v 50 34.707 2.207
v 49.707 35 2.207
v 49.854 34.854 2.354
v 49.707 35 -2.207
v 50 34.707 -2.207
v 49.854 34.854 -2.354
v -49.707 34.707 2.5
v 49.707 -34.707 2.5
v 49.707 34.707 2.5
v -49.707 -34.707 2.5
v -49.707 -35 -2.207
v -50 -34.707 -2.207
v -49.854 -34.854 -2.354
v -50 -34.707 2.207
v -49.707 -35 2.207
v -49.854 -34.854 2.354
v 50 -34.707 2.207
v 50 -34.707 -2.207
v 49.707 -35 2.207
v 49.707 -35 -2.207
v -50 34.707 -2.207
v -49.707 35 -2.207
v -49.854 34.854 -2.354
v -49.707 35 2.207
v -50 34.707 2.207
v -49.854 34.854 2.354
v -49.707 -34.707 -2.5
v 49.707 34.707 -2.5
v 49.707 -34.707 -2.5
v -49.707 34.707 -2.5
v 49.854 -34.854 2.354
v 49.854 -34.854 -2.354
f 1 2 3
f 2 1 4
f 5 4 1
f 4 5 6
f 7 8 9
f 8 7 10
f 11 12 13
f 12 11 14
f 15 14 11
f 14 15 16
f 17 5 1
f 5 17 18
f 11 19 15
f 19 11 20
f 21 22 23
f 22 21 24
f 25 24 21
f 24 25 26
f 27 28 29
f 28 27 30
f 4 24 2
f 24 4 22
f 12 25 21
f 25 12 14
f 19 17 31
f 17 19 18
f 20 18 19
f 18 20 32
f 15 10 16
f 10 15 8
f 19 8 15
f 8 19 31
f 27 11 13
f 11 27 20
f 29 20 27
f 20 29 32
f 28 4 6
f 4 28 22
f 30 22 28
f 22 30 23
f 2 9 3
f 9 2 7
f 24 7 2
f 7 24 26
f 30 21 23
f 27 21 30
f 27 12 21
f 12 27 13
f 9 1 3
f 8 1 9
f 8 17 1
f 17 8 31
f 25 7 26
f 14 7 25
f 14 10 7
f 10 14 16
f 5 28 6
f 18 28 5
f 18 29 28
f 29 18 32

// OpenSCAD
/*[Part]*/
part_to_print = "tile base"; // [tile base, tile, puzzle base, puzzle piece]
tile_or_puzzle_piece_number = 1; // [1,2,3,4,5,6,7,8,9,10,11,12,13,14,15,16,17,18,19,20]
//does not apply to base-specific measurements
scale_all_parts = 100; // [50:500]

/*[Base Options]*/
base_width = 100; // [20:300]
base_height = 70; // [20:300]
base_thickness = 5; // [3:10]

/*[Tile Base Options]*/
num_columns = 3; // [1:5]
num_rows = 2; // [1:5]
rail_width = 2; // [0:20]
include_target_graphics = "yes"; // [yes,no]
include_tile_slots = "yes"; // [yes,no]
include_earth_and_sky_lines = "no"; // [yes,no]

/*[Puzzle Base Options]*/
base_shape = "rectangular"; // [rectangular, circular]
include_puzzle_piece_slots = "no"; // [yes,no]

/*[Tile-Piece Options]*/
tile_thickness = 3; // [3:9]
slot_gap = 1; // [0:0.1:3]
graphic_height = 2; // [1:5]

/*[--Tile-Piece 1 Info]*/
tile_piece_svg_1 = "";
move_1_vertically = 0; // [-200:200]
move_piece_1_horizontally = 0; // [-200:200]
piece_1_scaling = 100; // [50:200]
piece_1_height = 20; // [5:300]
piece_1_width = 20; // [5:300]
embed_RFID_tag_1 = "no"; // [yes,no]

/*[--Tile-Piece 2 Info]*/
tile_piece_svg_2 = "";
move_2_vertically = 0; // [-200:200]
move_piece_2_horizontally = 0; // [-200:200]
piece_2_scaling = 100; // [50:200]
piece_2_height = 20; // [5:300]
piece_2_width = 20; // [5:300]
embed_RFID_tag_2 = "no"; // [yes,no]

/*[--Tile-Piece 3 Info]*/
tile_piece_svg_3 = "";
move_3_vertically = 0; // [-200:200]
move_piece_3_horizontally = 0; // [-200:200]
piece_3_scaling = 100; // [50:200]
piece_3_height = 20; // [5:300]
piece_3_width = 20; // [5:300]
embed_RFID_tag_3 = "no"; // [yes,no]

/*[--Tile-Piece 4 Info]*/
tile_piece_svg_4 = "";
move_4_vertically = 0; // [-200:200]
move_piece_4_horizontally = 0; // [-200:200]
piece_4_scaling = 100; // [50:200]
piece_4_height = 20; // [5:300]
piece_4_width = 20; // [5:300]
embed_RFID_tag_4 = "no"; // [yes,no]

/*[--Tile-Piece 5 Info]*/
tile_piece_svg_5 = "";
move_5_vertically = 0; // [-200:200]
move_piece_5_horizontally = 0; // [-200:200]
piece_5_scaling = 100; // [50:200]
piece_5_height = 20; // [5:300]
piece_5_width = 20; // [5:300]
embed_RFID_tag_5 = "no"; // [yes,no]

/*[--Tile-Piece 6 Info]*/
tile_piece_svg_6 = "";
move_6_vertically = 0; // [-200:200]
move_piece_6_horizontally = 0; // [-200:200]
piece_6_scaling = 100; // [50:200]
piece_6_height = 20; // [5:300]
piece_6_width = 20; // [5:300]
embed_RFID_tag_6 = "no"; // [yes,no]

/*[--Tile-Piece 7 Info]*/
tile_piece_svg_7 = "";
move_7_vertically = 0; // [-200:200]
move_piece_7_horizontally = 0; // [-200:200]
piece_7_scaling = 100; // [50:200]
piece_7_height = 20; // [10:300]
piece_7_width = 20; // [10:300]
embed_RFID_tag_7 = "no"; // [yes,no]

/*[--Tile-Piece 8 Info]*/
tile_piece_svg_8 = "";
move_8_vertically = 0; // [-200:200]
move_piece_8_horizontally = 0; // [-200:200]
piece_8_scaling = 100; // [50:200]
piece_8_height = 20; // [10:300]
piece_8_width = 20; // [10:300]
embed_RFID_tag_8 = "no"; // [yes,no]

/*[--Tile-Piece 9 Info]*/
tile_piece_svg_9 = "";
move_9_vertically = 0; // [-200:200]
move_piece_9_horizontally = 0; // [-200:200]
piece_9_scaling = 100; // [50:200]
piece_9_height = 20; // [10:300]
piece_9_width = 20; // [10:300]
embed_RFID_tag_9 = "no"; // [yes,no]

/*[--Tile-Piece 10 Info]*/
tile_piece_svg_10 = "";
move_10_vertically = 0; // [-200:200]
move_piece_10_horizontally = 0; // [-200:200]
piece_10_scaling = 100; // [50:200]
piece_10_height = 20; // [10:300]
piece_10_width = 20; // [10:300]
embed_RFID_tag_10 = "no"; // [yes,no]

/*[--Tile-Piece 11 Info]*/
tile_piece_svg_11 = "";
move_11_vertically = 0; // [-200:200]
move_piece_11_horizontally = 0; // [-200:200]
piece_11_scaling = 100; // [50:200]
piece_11_height = 20; // [10:300]
piece_11_width = 20; // [10:300]
embed_RFID_tag_11 = "no"; // [yes,no]

/*[--Tile-Piece 12 Info]*/
tile_piece_svg_12 = "";
move_12_vertically = 0; // [-200:200]
move_piece_12_horizontally = 0; // [-200:200]
piece_12_scaling = 100; // [50:200]
piece_12_height = 20; // [10:300]
piece_12_width = 20; // [10:300]
embed_RFID_tag_12 = "no"; // [yes,no]

/*[--Tile-Piece 13 Info]*/
tile_piece_svg_13 = "";
move_13_vertically = 0; // [-200:200]
move_piece_13_horizontally = 0; // [-200:200]
piece_13_scaling = 100; // [50:200]
piece_13_height = 20; // [10:300]
piece_13_width = 20; // [10:300]
embed_RFID_tag_13 = "no"; // [yes,no]

/*[--Tile-Piece 14 Info]*/
tile_piece_svg_14 = "";
move_14_vertically = 0; // [-200:200]
move_piece_14_horizontally = 0; // [-200:200]
piece_14_scaling = 100; // [50:200]
piece_14_height = 20; // [10:300]
piece_14_width = 20; // [10:300]
embed_RFID_tag_14 = "no"; // [yes,no]

/*[--Tile-Piece 15 Info]*/
tile_piece_svg_15 = "";
move_15_vertically = 0; // [-200:200]
move_piece_15_horizontally = 0; // [-200:200]
piece_15_scaling = 100; // [50:200]
piece_15_height = 20; // [10:300]
piece_15_width = 20; // [10:300]
embed_RFID_tag_15 = "no"; // [yes,no]

/*[--Tile-Piece 16 Info]*/
tile_piece_svg_16 = "";
move_16_vertically = 0; // [-200:200]
move_piece_16_horizontally = 0; // [-200:200]
piece_16_scaling = 100; // [50:200]
piece_16_height = 20; // [10:300]
piece_16_width = 20; // [10:300]
embed_RFID_tag_16 = "no"; // [yes,no]

/*[--Tile-Piece 17 Info]*/
tile_piece_svg_17 = "";
move_17_vertically = 0; // [-200:200]
move_piece_17_horizontally = 0; // [-200:200]
piece_17_scaling = 100; // [50:200]
piece_17_height = 20; // [10:300]
piece_17_width = 20; // [10:300]
embed_RFID_tag_17 = "no"; // [yes,no]

/*[--Tile-Piece 18 Info]*/
tile_piece_svg_18 = "";
move_18_vertically = 0; // [-200:200]
move_piece_18_horizontally = 0; // [-200:200]
piece_18_scaling = 100; // [50:200]
piece_18_height = 20; // [10:300]
piece_18_width = 20; // [10:300]
embed_RFID_tag_18 = "no"; // [yes,no]

/*[--Tile-Piece 19 Info]*/
tile_piece_svg_19 = "";
move_19_vertically = 0; // [-200:200]
move_piece_19_horizontally = 0; // [-200:200]
piece_19_scaling = 100; // [50:200]
piece_19_height = 20; // [10:300]
piece_19_width = 20; // [10:300]
embed_RFID_tag_19 = "no"; // [yes,no]

/*[--Tile-Piece 20 Info]*/
tile_piece_svg_20 = "";
move_20_vertically = 0; // [-200:200]
move_piece_20_horizontally = 0; // [-200:200]
piece_20_scaling = 100; // [50:200]
piece_20_height = 20; // [10:300]
piece_20_width = 20; // [10:300]
embed_RFID_tag_20 = "no"; // [yes,no]

/*[---Decoration 1 Info]*/
decoration_type_1 = "-none-"; // [-none-,circle,line]
// height value is in 10ths of a millimeter
height_1 = 0; // [0:20]
b_1 = 0;
c_1 = 0;
d_1 = 0;
e_1 = 0;
f_1 = 0;

/*[---Decoration 2 Info]*/
decoration_type_2 = "-none-"; // [-none-,circle,line]
// height value is in 10ths of a millimeter
height_2 = 0; // [0:20]
b_2 = 0;
c_2 = 0;
d_2 = 0;
e_2 = 0;
f_2 = 0;

/*[---Decoration 3 Info]*/
decoration_type_3 = "-none-"; // [-none-,circle,line]
// height value is in 10ths of a millimeter
height_3 = 0; // [0:20]
b_3 = 0;
c_3 = 0;
d_3 = 0;
e_3 = 0;
f_3 = 0;

/*[---Decoration 4 Info]*/
decoration_type_4 = "-none-"; // [-none-,circle,line]
// height value is in 10ths of a millimeter
height_4 = 0; // [0:20]
b_4 = 0;
c_4 = 0;
d_4 = 0;
e_4 = 0;
f_4 = 0;

/*[---Decoration 5 Info]*/
decoration_type_5 = "-none-"; // [-none-,circle,line]
// height value is in 10ths of a millimeter
height_5 = 0; // [0:20]
b_5 = 0;
c_5 = 0;
d_5 = 0;
e_5 = 0;
f_5 = 0;




/*[Hidden]*/

// Version of this .scad; the web app compares a user's local copy against the
// published manifest (latest_tiles_version.json) to offer updates. Released via
// "bump btp" (see RELEASING.md). On GitHub main this must equal the manifest's
// version.
scad_version = 7;

//general
chamfer = .5;
fudge = 0.005;
sap = scale_all_parts/100;

//base
b_w = base_width;
b_h = base_height;
b_t = base_thickness;

//tile base
row_offset = (include_target_graphics == "yes" && include_tile_slots=="yes") ? 2 : 1;

// c_ = 1;
c_ = 2;
e_ = b_w - 2*c_;
d_ = b_h - 2*c_;
f_ = e_/num_columns;
t_r = (include_target_graphics=="yes") ? 2 : 1;
g_ = d_/(num_rows*t_r);
h_ = (num_rows>1) ? rail_width/2 : 0;
i_ = (num_columns>1) ? rail_width/2 :0;
j_ = f_ - 2*i_;
k_ = g_ - 2*h_;

c_x = (b_w - 2*c_)/num_columns - 2*h_;
c_y = (b_h - 2*c_)/(num_rows*row_offset) - 2*h_;

gap3 = min(c_x,c_y);

b_x = (((b_w-2*c_)/num_columns)-gap3)/2;
b_y = ((b_h-2*c_)/(num_rows*row_offset)-gap3)/2;

base_x0 = -b_w/2;
base_y0 = -b_h/2;

//tiles
tile_width = j_;
tile_height = k_;

total_rows = (include_target_graphics=="yes" && include_tile_slots=="yes") ? num_rows*2 : num_rows;
inter_row_distance = (b_h - c_*2 - tile_height*total_rows)/total_rows;

s_g = slot_gap;

tile_slot_width = tile_width;
tile_slot_height = tile_height;
t_h = tile_height - s_g;
t_w = tile_width - s_g;


echo(tile_slot_width=tile_slot_width);
echo(tile_slot_height=tile_slot_height);
echo(tile_width=t_w);
echo(tile_height=t_h);

//graphics
tile_piece_svgs = concat(tile_piece_svg_1,tile_piece_svg_2,tile_piece_svg_3,tile_piece_svg_4,tile_piece_svg_5,tile_piece_svg_6,tile_piece_svg_7,tile_piece_svg_8,tile_piece_svg_9,tile_piece_svg_10,tile_piece_svg_11,tile_piece_svg_12,tile_piece_svg_13,tile_piece_svg_14,tile_piece_svg_15,tile_piece_svg_16,tile_piece_svg_17,tile_piece_svg_18,tile_piece_svg_19,tile_piece_svg_20);

vertical_move = concat(move_1_vertically*sap,move_2_vertically*sap,move_3_vertically*sap,move_4_vertically*sap,move_5_vertically*sap,move_6_vertically*sap,move_7_vertically*sap,move_8_vertically*sap,move_9_vertically*sap,move_10_vertically*sap,move_11_vertically*sap,move_12_vertically*sap,move_13_vertically*sap,move_14_vertically*sap,move_15_vertically*sap,move_16_vertically*sap,move_17_vertically*sap,move_18_vertically*sap,move_19_vertically*sap,move_20_vertically*sap);

horizonal_move = concat(move_piece_1_horizontally*sap,move_piece_2_horizontally*sap,move_piece_3_horizontally*sap,move_piece_4_horizontally*sap,move_piece_5_horizontally*sap,move_piece_6_horizontally*sap,move_piece_7_horizontally*sap,move_piece_8_horizontally*sap,move_piece_9_horizontally*sap,move_piece_10_horizontally*sap,move_piece_11_horizontally*sap,move_piece_12_horizontally*sap,move_piece_13_horizontally*sap,move_piece_14_horizontally*sap,move_piece_15_horizontally*sap,move_piece_16_horizontally*sap,move_piece_17_horizontally*sap,move_piece_18_horizontally*sap,move_piece_19_horizontally*sap,move_piece_20_horizontally*sap);

piece_scaling = concat(piece_1_scaling*sap,piece_2_scaling*sap,piece_3_scaling*sap,piece_4_scaling*sap,piece_5_scaling*sap,piece_6_scaling*sap,piece_7_scaling*sap,piece_8_scaling*sap,piece_9_scaling*sap,piece_10_scaling*sap,piece_11_scaling*sap,piece_12_scaling*sap,piece_13_scaling*sap,piece_14_scaling*sap,piece_15_scaling*sap,piece_16_scaling*sap,piece_17_scaling*sap,piece_18_scaling*sap,piece_19_scaling*sap,piece_20_scaling*sap);

piece_height = concat(piece_1_height*sap,piece_2_height*sap,piece_3_height*sap,piece_4_height*sap,piece_5_height*sap,piece_6_height*sap,piece_7_height*sap,piece_8_height*sap,piece_9_height*sap,piece_10_height*sap,piece_11_height*sap,piece_12_height*sap,piece_13_height*sap,piece_14_height*sap,piece_15_height*sap,piece_16_height*sap,piece_17_height*sap,piece_18_height*sap,piece_19_height*sap,piece_20_height*sap);

piece_width = concat(piece_1_width*sap,piece_2_width*sap,piece_3_width*sap,piece_4_width*sap,piece_5_width*sap,piece_6_width*sap,piece_7_width*sap,piece_8_width*sap,piece_9_width*sap,piece_10_width*sap,piece_11_width*sap,piece_12_width*sap,piece_13_width*sap,piece_14_width*sap,piece_15_width*sap,piece_16_width*sap,piece_17_width*sap,piece_18_width*sap,piece_19_width*sap,piece_20_width*sap);

embed_tag = concat(embed_RFID_tag_1,embed_RFID_tag_2,embed_RFID_tag_3,embed_RFID_tag_4,embed_RFID_tag_5,embed_RFID_tag_6,embed_RFID_tag_7,embed_RFID_tag_8,embed_RFID_tag_9,embed_RFID_tag_10,embed_RFID_tag_11,embed_RFID_tag_12,embed_RFID_tag_13,embed_RFID_tag_14,embed_RFID_tag_15,embed_RFID_tag_16,embed_RFID_tag_17,embed_RFID_tag_18,embed_RFID_tag_19,embed_RFID_tag_20);

// tile_piece_graphic — raise a prepped SVG (a filled stroke outline) into a solid.
// The 2D scale is DERIVED per piece as band_scale_factor / svg_mm_per_unit; the prepped
// SVG is scaled by that band factor (0.1875 mm/unit). NOTE: this is ~1.133x LARGER than the
// old baked "core concepts" STLs, which predate the band-scale rework. The ~6 mm
// Z span matches too, so every caller's placement (.../2 - (6 - graphic_height)) and
// graphic_height behavior stay unchanged. Two-step 45-degree top chamfer. In the web
// app the referenced SVG is prepped and written to `path` in the WASM filesystem.
earth_sky_half_span = 12;   // engraved lines at y = +/-12, same as the symbol designer
bliss_band_units = 128;     // sky line 130 -> earth line 258 on the 324 matrix
band_scale_factor = 2*earth_sky_half_span / bliss_band_units;   // 0.1875 mm per SVG unit at the band
tile_piece_mm_per_unit = [1,1,1,1,1,1,1,1,1,1,1,1,1,1,1,1,1,1,1,1];   // app-managed: each piece's prepped mm/unit (the web app normalizes every SVG to 1)
tile_piece_offset_y = [0,0,0,0,0,0,0,0,0,0,0,0,0,0,0,0,0,0,0,0];   // app-managed: each piece's vertical offset, in SVG units, from the guideline band center (X is not registered -- a tile graphic centers on its own ink)
render_part = "all";   // "all"=base+graphics, "symbol"=base only, "graphic"=raised graphics only (web-app two-color passes)
draw_base = (render_part != "graphic");
draw_graphics = (render_part != "symbol");
module tile_piece_graphic(path, mm_per_unit=1, off_y=0){
	sc = band_scale_factor / mm_per_unit;   // derived 2D scale for this piece
	cs = 0.1;          // chamfer step: mm in and up per slice
	bh = 6 - 2*cs;     // body height so the top lands at z = 6 (baked-STL span)
	// Registration: a tile can be engraved with sky and earth lines, so the piece is
	// placed VERTICALLY on the GUIDELINE MATRIX rather than on its own ink --
	// import(center=true) centers each file on its content bbox, so a component split
	// out of a symbol would sit at the band's middle instead of at its own height. The
	// web app passes the offset from the sky-earth band center to this file's ink
	// center, which cancels the centering on Y and restores the absolute height; the
	// Symbols designer's graphic() does exactly the same. HORIZONTALLY the piece stays
	// ink-centered (Ken, 2026-08-14), so it sits in the middle of its tile whatever it
	// is -- again matching graphic(), whose X translate is hardcoded 0.
	translate([0, off_y*sc, 0])
	union(){
		linear_extrude(height=bh)
			scale([sc,sc]) import(file=path, center=true);
		for (i=[1:2])
			translate([0,0, bh + (i-1)*cs])
			linear_extrude(height=cs)
			offset(delta=-i*cs)
			scale([sc,sc]) import(file=path, center=true);
	}
}


a = concat(height_1/10,height_2/10,height_3/10,height_4/10,height_5/10);
b = concat(b_1,b_2,b_3,b_4,b_5);
c = concat(c_1,c_2,c_3,c_4,c_5);
d = concat(d_1,d_2,d_3,d_4,d_5);
e = concat(e_1,e_2,e_3,e_4,e_5);
f = concat(f_1,f_2,f_3,f_4,f_5);
decoration_type = concat(decoration_type_1,decoration_type_2,decoration_type_3,decoration_type_4,decoration_type_5);



//****************** Main Program **********************************

if (part_to_print == "tile base"){
	//create base slab with cutouts
	if (draw_base) difference(){

		chamfered_cuboid(b_w,b_h,b_t,chamfer);
		
		for (i = [0:(num_rows-1)*row_offset]){
			if (i%row_offset==0){
				y = base_y0+gap3/2+c_+b_y+gap3*i+b_y*2*i;
				if (include_tile_slots=="yes"){
					for (j = [0:num_columns-1]){
						graphic = tile_piece_svgs[i/row_offset*num_columns+j];
						if (graphic != ""){
							x = base_x0+gap3/2+c_+b_x+gap3*j+b_x*2*j;
							translate([x, y, b_t/2 - tile_thickness/2 + 1])
							cube([tile_slot_width,tile_slot_height,tile_thickness+2],center=true);
						}
					}
				}
				if (include_earth_and_sky_lines=="yes"){
					spread = 2*earth_sky_half_span*sap;
					earth_y1 = y-(spread/2);
					sky_y1 = earth_y1+(spread);
					
					translate([0,earth_y1,b_t/2+fudge])
					rotate([0,90,0])
					translate([0,0,-b_w/2])
					linear_extrude(height=b_w)
					circle(d=sap*2,$fn=2);
				
					translate([0,sky_y1,b_t/2+fudge])
					rotate([0,90,0])
					translate([0,0,-b_w/2])
					linear_extrude(height=b_w)
					circle(d=sap,$fn=2);
					
					if(include_target_graphics=="yes" && include_tile_slots=="yes"){
						earth_y2 = sky_y1+tile_height-spread+inter_row_distance;
						sky_y2 = earth_y2+(spread);
						
						translate([0,earth_y2,b_t/2+fudge])
						rotate([0,90,0])
						translate([0,0,-b_w/2])
						linear_extrude(height=b_w)
						circle(d=sap*2,$fn=2);

					
						translate([0,sky_y2,b_t/2+fudge])
						rotate([0,90,0])
						translate([0,0,-b_w/2])
						linear_extrude(height=b_w)
						circle(d=sap,$fn=2);
					}
				}	
			}
		}
	}

	// add graphics in target rows
	if (draw_graphics && include_target_graphics == "yes"){
		color("SlateGrey")
		for (i = [0:(num_rows-1)*row_offset]){
			if (i%row_offset==0){
			
				for (j = [0:num_columns-1]){
					svg = tile_piece_svgs[i/row_offset*num_columns+j];
					mmpu = tile_piece_mm_per_unit[i/row_offset*num_columns+j];
					offy = tile_piece_offset_y[i/row_offset*num_columns+j];
					if (svg != ""){
						target_offset = (include_tile_slots=="yes") ? 1 : 0;
						y_offset = vertical_move[i/row_offset*num_columns+j];
						x_offset = horizonal_move[i/row_offset*num_columns+j];
						x = base_x0+gap3/2+c_+b_x+gap3*j+b_x*2*j;
						y = base_y0+c_+b_y+gap3/2+(gap3+b_y*2)*(i+target_offset);
						translate([x+x_offset, y+y_offset, b_t/2 - (6 - graphic_height)])
						scale([sap,sap,1])
						tile_piece_graphic(svg, mmpu, offy);
					}
				}
			}
		}
	}
}
else if (part_to_print == "tile"){
			
	difference(){
		union(){
			if (draw_base) difference(){
				chamfered_cuboid(tile_width-s_g,tile_height-s_g,tile_thickness,chamfer);
				
				if (include_earth_and_sky_lines=="yes"){
					spread = 2*earth_sky_half_span*sap;
					earth_y1 = -gap3/2+(gap3-spread)/2;
					sky_y1 = earth_y1+(spread);

					translate([0,earth_y1,tile_thickness/2+fudge])
					rotate([0,90,0])
					translate([0,0,-gap3/2])
					linear_extrude(height=gap3)
					circle(d=sap*2,$fn=2);
				
					translate([0,sky_y1,tile_thickness/2+fudge])
					rotate([0,90,0])
					translate([0,0,-gap3/2])
					linear_extrude(height=gap3)
					circle(d=sap,$fn=2);
				}
			}
			
			svg = tile_piece_svgs[tile_or_puzzle_piece_number-1];
			mmpu = tile_piece_mm_per_unit[tile_or_puzzle_piece_number-1];
			offy = tile_piece_offset_y[tile_or_puzzle_piece_number-1];
			
			if (draw_graphics && svg != ""){
				offset = vertical_move[tile_or_puzzle_piece_number-1];
				offset_x = horizonal_move[tile_or_puzzle_piece_number-1];
				color("SlateGrey")
				translate([offset_x, offset, tile_thickness/2 - (6 - graphic_height)])
				scale([sap,sap,1])
				tile_piece_graphic(svg, mmpu, offy);
			}
		}
		
		translate([0,0,-tile_thickness/2-3-fudge])
		cube([tile_width*2,tile_height*2,6],center=true);
			
		//RFID tag
		if(embed_tag[tile_or_puzzle_piece_number-1]=="yes"){
			add_RFID_slot();
		}
	}
}

else if (part_to_print == "puzzle base"){
	
	if (include_puzzle_piece_slots=="yes"){
		if (draw_base) difference(){
			union(){
				if(base_shape == "rectangular"){
					chamfered_cuboid(b_w,b_h,b_t,chamfer);
				}
				else{
					chamfered_disk(b_w,b_t,chamfer);
				}
			}
			for (i = [0:19]){
				graphic = tile_piece_svgs[i];
				if (graphic != ""){
					graphic_x = horizonal_move[i];
					graphic_y = vertical_move[i];
					graphic_scale = 100;
					piece_base_width = piece_width[i];
					piece_base_height = piece_height[i];
					slot_width = piece_base_width + s_g;
					slot_height = piece_base_height + s_g;
					if (include_tile_slots=="yes"){
						translate([graphic_x, graphic_y, tile_thickness/2+2.5+fudge])
						cube([slot_width,slot_height,tile_thickness+5],center=true);
					}
				}
			}
		}
		if (draw_graphics) add_decorations();
	}
	
	else{
	
		if (draw_base) if(base_shape == "rectangular"){
			chamfered_cuboid(b_w,b_h,b_t,chamfer);
		}
		else{
			chamfered_disk(b_w,b_t,chamfer);
		}
		
		if (draw_graphics) color("SlateGrey")
		for (i = [0:19]){
			svg = tile_piece_svgs[i];
			mmpu = tile_piece_mm_per_unit[i];
			// no guideline registration on a puzzle -- the graphic centers on its piece
			
			if (svg != ""){
				graphic_x = horizonal_move[i];
				graphic_y = vertical_move[i];
				graphic_scale = piece_scaling[i]/100;
			
				translate([graphic_x, graphic_y, b_t/2 - (6 - graphic_height)])
				scale([graphic_scale,graphic_scale,1])
				tile_piece_graphic(svg, mmpu);
			
			}
		}
		
		if (draw_graphics) add_decorations();
	}
	
}
else if (part_to_print == "puzzle piece"){
	
	svg = tile_piece_svgs[tile_or_puzzle_piece_number-1];
	mmpu = tile_piece_mm_per_unit[tile_or_puzzle_piece_number-1];
	// no guideline registration on a puzzle -- the graphic centers on its piece
	piece_base_width = piece_width[tile_or_puzzle_piece_number-1];
	piece_base_height = piece_height[tile_or_puzzle_piece_number-1];
	graphic_scale = piece_scaling[tile_or_puzzle_piece_number-1]/100;

	difference(){
		union(){
			
			if (draw_graphics && svg != ""){
				color("SlateGrey")
				translate([0, 0, tile_thickness/2 - (6 - graphic_height)])
				scale([graphic_scale,graphic_scale,1])
				tile_piece_graphic(svg, mmpu);
			}
				
			if (draw_base) chamfered_cuboid(piece_base_width, piece_base_height, tile_thickness,chamfer);
		}
		
		s_g = slot_gap;

		offset_x = horizonal_move[tile_or_puzzle_piece_number-1];
		offset_y = vertical_move[tile_or_puzzle_piece_number-1];

		for (i = [tile_or_puzzle_piece_number:19]){
			graphic = tile_piece_svgs[i];
			
			if (graphic != ""){
				graphic_x = horizonal_move[i] - offset_x;
				graphic_y = vertical_move[i] - offset_y;
				piece_base_width = piece_width[i];
				piece_base_height = piece_height[i];
				slot_width = piece_base_width + s_g;
				slot_height = piece_base_height + s_g;
				if (include_tile_slots=="yes"){
					translate([graphic_x, graphic_y, 0])
					cube([slot_width,slot_height,(tile_thickness + graphic_height) * 2 + 5],center=true);
				}
			}
		}

		translate([0,0,-tile_thickness/2-3-fudge])
		cube([piece_base_width*2,piece_base_height*2,6],center=true);
			
		//RFID tag
		if(embed_tag[tile_or_puzzle_piece_number-1]=="yes"){
			add_RFID_slot();
		}
	}
}





//********************************** Modules **************************************

module chamfered_cuboid (x, y, z, c){
	intersection(){	
		translate([0,0,-z/2])
		linear_extrude(height=z)
		offset(delta=c, chamfer=true)
		square([x-2*c,y-2*c],center=true);

		rotate([0,90,0])
		translate([0,0,-x/2])
		linear_extrude(height=x)
		offset(delta=c, chamfer=true)
		square([z-2*c,y-2*c],center=true);

		rotate([90,0,0])
		translate([0,0,-y/2])
		linear_extrude(height=y)
		offset(delta=c, chamfer=true)
		square([x-2*c,z-2*c],center=true);
	}
}

module chamfered_disk (dia, thick, c){
	r = dia/2;
	
	translate([0,0,-thick/2])
	rotate_extrude($fn=200)
	polygon( points=[[0,0],[r-c,0],[r,c],[r,thick-c],[r-c,thick],[0,thick]] );
}

module add_RFID_slot(){
	translate([0,0,-tile_thickness/2+1])
	cylinder(d=30,h=1);
}

module add_decorations(){

	color("SlateGrey")
	for (i = [0:4]){
		if (a[i] > 0){
			if (decoration_type[i]=="circle") {
				// a[i] = decoration height
				// b[i] = circle thickness
				// c[i] = circle inner diameter
				// d[i] = move vertically
				// e[i] = move horizontally
				
				translate([e[i]*sap,d[i]*sap,1])
				linear_extrude(height=tile_thickness/2+a[i])
				difference(){
					circle(d=c[i]*sap+b[i]*sap, $fn=200);
					circle(d=c[i]*sap, $fn=200);
				}
			}
			else if (decoration_type[i]=="line"){
				// a[i] = decoration height
				// b[i] = x1
				// c[i] = y1
				// d[i] = x2
				// e[i] = y2
				// f[i] = line thickness
				
				bad = (b[i]==c[i] && d[i]==e[i] && b[i]==e[i]);
				if (!bad){
					run = d[i]*sap - b[i]*sap;
					sign_run = sign(run);
					rise = e[i]*sap - c[i]*sap;
					sign_rise = sign(rise);
					adjust = (sign_rise>=0 && sign_run>=0) ? 0 : 
							  (sign_rise>=0 && sign_run<0) ? -180 :
							  (sign_rise<0 && sign_run>=0) ? 0 :
															 -180;
					slope = atan(rise/run) + adjust;
					length = sqrt(rise*rise + run*run);
					
					translate([b[i]*sap,c[i]*sap,tile_thickness/2+1])
					rotate([0,0,slope])
					linear_extrude(height=a[i])
					translate([0,-f[i]/2*sap,0])
					square([length,f[i]*sap]);
				}
			}
		}
	}
}
